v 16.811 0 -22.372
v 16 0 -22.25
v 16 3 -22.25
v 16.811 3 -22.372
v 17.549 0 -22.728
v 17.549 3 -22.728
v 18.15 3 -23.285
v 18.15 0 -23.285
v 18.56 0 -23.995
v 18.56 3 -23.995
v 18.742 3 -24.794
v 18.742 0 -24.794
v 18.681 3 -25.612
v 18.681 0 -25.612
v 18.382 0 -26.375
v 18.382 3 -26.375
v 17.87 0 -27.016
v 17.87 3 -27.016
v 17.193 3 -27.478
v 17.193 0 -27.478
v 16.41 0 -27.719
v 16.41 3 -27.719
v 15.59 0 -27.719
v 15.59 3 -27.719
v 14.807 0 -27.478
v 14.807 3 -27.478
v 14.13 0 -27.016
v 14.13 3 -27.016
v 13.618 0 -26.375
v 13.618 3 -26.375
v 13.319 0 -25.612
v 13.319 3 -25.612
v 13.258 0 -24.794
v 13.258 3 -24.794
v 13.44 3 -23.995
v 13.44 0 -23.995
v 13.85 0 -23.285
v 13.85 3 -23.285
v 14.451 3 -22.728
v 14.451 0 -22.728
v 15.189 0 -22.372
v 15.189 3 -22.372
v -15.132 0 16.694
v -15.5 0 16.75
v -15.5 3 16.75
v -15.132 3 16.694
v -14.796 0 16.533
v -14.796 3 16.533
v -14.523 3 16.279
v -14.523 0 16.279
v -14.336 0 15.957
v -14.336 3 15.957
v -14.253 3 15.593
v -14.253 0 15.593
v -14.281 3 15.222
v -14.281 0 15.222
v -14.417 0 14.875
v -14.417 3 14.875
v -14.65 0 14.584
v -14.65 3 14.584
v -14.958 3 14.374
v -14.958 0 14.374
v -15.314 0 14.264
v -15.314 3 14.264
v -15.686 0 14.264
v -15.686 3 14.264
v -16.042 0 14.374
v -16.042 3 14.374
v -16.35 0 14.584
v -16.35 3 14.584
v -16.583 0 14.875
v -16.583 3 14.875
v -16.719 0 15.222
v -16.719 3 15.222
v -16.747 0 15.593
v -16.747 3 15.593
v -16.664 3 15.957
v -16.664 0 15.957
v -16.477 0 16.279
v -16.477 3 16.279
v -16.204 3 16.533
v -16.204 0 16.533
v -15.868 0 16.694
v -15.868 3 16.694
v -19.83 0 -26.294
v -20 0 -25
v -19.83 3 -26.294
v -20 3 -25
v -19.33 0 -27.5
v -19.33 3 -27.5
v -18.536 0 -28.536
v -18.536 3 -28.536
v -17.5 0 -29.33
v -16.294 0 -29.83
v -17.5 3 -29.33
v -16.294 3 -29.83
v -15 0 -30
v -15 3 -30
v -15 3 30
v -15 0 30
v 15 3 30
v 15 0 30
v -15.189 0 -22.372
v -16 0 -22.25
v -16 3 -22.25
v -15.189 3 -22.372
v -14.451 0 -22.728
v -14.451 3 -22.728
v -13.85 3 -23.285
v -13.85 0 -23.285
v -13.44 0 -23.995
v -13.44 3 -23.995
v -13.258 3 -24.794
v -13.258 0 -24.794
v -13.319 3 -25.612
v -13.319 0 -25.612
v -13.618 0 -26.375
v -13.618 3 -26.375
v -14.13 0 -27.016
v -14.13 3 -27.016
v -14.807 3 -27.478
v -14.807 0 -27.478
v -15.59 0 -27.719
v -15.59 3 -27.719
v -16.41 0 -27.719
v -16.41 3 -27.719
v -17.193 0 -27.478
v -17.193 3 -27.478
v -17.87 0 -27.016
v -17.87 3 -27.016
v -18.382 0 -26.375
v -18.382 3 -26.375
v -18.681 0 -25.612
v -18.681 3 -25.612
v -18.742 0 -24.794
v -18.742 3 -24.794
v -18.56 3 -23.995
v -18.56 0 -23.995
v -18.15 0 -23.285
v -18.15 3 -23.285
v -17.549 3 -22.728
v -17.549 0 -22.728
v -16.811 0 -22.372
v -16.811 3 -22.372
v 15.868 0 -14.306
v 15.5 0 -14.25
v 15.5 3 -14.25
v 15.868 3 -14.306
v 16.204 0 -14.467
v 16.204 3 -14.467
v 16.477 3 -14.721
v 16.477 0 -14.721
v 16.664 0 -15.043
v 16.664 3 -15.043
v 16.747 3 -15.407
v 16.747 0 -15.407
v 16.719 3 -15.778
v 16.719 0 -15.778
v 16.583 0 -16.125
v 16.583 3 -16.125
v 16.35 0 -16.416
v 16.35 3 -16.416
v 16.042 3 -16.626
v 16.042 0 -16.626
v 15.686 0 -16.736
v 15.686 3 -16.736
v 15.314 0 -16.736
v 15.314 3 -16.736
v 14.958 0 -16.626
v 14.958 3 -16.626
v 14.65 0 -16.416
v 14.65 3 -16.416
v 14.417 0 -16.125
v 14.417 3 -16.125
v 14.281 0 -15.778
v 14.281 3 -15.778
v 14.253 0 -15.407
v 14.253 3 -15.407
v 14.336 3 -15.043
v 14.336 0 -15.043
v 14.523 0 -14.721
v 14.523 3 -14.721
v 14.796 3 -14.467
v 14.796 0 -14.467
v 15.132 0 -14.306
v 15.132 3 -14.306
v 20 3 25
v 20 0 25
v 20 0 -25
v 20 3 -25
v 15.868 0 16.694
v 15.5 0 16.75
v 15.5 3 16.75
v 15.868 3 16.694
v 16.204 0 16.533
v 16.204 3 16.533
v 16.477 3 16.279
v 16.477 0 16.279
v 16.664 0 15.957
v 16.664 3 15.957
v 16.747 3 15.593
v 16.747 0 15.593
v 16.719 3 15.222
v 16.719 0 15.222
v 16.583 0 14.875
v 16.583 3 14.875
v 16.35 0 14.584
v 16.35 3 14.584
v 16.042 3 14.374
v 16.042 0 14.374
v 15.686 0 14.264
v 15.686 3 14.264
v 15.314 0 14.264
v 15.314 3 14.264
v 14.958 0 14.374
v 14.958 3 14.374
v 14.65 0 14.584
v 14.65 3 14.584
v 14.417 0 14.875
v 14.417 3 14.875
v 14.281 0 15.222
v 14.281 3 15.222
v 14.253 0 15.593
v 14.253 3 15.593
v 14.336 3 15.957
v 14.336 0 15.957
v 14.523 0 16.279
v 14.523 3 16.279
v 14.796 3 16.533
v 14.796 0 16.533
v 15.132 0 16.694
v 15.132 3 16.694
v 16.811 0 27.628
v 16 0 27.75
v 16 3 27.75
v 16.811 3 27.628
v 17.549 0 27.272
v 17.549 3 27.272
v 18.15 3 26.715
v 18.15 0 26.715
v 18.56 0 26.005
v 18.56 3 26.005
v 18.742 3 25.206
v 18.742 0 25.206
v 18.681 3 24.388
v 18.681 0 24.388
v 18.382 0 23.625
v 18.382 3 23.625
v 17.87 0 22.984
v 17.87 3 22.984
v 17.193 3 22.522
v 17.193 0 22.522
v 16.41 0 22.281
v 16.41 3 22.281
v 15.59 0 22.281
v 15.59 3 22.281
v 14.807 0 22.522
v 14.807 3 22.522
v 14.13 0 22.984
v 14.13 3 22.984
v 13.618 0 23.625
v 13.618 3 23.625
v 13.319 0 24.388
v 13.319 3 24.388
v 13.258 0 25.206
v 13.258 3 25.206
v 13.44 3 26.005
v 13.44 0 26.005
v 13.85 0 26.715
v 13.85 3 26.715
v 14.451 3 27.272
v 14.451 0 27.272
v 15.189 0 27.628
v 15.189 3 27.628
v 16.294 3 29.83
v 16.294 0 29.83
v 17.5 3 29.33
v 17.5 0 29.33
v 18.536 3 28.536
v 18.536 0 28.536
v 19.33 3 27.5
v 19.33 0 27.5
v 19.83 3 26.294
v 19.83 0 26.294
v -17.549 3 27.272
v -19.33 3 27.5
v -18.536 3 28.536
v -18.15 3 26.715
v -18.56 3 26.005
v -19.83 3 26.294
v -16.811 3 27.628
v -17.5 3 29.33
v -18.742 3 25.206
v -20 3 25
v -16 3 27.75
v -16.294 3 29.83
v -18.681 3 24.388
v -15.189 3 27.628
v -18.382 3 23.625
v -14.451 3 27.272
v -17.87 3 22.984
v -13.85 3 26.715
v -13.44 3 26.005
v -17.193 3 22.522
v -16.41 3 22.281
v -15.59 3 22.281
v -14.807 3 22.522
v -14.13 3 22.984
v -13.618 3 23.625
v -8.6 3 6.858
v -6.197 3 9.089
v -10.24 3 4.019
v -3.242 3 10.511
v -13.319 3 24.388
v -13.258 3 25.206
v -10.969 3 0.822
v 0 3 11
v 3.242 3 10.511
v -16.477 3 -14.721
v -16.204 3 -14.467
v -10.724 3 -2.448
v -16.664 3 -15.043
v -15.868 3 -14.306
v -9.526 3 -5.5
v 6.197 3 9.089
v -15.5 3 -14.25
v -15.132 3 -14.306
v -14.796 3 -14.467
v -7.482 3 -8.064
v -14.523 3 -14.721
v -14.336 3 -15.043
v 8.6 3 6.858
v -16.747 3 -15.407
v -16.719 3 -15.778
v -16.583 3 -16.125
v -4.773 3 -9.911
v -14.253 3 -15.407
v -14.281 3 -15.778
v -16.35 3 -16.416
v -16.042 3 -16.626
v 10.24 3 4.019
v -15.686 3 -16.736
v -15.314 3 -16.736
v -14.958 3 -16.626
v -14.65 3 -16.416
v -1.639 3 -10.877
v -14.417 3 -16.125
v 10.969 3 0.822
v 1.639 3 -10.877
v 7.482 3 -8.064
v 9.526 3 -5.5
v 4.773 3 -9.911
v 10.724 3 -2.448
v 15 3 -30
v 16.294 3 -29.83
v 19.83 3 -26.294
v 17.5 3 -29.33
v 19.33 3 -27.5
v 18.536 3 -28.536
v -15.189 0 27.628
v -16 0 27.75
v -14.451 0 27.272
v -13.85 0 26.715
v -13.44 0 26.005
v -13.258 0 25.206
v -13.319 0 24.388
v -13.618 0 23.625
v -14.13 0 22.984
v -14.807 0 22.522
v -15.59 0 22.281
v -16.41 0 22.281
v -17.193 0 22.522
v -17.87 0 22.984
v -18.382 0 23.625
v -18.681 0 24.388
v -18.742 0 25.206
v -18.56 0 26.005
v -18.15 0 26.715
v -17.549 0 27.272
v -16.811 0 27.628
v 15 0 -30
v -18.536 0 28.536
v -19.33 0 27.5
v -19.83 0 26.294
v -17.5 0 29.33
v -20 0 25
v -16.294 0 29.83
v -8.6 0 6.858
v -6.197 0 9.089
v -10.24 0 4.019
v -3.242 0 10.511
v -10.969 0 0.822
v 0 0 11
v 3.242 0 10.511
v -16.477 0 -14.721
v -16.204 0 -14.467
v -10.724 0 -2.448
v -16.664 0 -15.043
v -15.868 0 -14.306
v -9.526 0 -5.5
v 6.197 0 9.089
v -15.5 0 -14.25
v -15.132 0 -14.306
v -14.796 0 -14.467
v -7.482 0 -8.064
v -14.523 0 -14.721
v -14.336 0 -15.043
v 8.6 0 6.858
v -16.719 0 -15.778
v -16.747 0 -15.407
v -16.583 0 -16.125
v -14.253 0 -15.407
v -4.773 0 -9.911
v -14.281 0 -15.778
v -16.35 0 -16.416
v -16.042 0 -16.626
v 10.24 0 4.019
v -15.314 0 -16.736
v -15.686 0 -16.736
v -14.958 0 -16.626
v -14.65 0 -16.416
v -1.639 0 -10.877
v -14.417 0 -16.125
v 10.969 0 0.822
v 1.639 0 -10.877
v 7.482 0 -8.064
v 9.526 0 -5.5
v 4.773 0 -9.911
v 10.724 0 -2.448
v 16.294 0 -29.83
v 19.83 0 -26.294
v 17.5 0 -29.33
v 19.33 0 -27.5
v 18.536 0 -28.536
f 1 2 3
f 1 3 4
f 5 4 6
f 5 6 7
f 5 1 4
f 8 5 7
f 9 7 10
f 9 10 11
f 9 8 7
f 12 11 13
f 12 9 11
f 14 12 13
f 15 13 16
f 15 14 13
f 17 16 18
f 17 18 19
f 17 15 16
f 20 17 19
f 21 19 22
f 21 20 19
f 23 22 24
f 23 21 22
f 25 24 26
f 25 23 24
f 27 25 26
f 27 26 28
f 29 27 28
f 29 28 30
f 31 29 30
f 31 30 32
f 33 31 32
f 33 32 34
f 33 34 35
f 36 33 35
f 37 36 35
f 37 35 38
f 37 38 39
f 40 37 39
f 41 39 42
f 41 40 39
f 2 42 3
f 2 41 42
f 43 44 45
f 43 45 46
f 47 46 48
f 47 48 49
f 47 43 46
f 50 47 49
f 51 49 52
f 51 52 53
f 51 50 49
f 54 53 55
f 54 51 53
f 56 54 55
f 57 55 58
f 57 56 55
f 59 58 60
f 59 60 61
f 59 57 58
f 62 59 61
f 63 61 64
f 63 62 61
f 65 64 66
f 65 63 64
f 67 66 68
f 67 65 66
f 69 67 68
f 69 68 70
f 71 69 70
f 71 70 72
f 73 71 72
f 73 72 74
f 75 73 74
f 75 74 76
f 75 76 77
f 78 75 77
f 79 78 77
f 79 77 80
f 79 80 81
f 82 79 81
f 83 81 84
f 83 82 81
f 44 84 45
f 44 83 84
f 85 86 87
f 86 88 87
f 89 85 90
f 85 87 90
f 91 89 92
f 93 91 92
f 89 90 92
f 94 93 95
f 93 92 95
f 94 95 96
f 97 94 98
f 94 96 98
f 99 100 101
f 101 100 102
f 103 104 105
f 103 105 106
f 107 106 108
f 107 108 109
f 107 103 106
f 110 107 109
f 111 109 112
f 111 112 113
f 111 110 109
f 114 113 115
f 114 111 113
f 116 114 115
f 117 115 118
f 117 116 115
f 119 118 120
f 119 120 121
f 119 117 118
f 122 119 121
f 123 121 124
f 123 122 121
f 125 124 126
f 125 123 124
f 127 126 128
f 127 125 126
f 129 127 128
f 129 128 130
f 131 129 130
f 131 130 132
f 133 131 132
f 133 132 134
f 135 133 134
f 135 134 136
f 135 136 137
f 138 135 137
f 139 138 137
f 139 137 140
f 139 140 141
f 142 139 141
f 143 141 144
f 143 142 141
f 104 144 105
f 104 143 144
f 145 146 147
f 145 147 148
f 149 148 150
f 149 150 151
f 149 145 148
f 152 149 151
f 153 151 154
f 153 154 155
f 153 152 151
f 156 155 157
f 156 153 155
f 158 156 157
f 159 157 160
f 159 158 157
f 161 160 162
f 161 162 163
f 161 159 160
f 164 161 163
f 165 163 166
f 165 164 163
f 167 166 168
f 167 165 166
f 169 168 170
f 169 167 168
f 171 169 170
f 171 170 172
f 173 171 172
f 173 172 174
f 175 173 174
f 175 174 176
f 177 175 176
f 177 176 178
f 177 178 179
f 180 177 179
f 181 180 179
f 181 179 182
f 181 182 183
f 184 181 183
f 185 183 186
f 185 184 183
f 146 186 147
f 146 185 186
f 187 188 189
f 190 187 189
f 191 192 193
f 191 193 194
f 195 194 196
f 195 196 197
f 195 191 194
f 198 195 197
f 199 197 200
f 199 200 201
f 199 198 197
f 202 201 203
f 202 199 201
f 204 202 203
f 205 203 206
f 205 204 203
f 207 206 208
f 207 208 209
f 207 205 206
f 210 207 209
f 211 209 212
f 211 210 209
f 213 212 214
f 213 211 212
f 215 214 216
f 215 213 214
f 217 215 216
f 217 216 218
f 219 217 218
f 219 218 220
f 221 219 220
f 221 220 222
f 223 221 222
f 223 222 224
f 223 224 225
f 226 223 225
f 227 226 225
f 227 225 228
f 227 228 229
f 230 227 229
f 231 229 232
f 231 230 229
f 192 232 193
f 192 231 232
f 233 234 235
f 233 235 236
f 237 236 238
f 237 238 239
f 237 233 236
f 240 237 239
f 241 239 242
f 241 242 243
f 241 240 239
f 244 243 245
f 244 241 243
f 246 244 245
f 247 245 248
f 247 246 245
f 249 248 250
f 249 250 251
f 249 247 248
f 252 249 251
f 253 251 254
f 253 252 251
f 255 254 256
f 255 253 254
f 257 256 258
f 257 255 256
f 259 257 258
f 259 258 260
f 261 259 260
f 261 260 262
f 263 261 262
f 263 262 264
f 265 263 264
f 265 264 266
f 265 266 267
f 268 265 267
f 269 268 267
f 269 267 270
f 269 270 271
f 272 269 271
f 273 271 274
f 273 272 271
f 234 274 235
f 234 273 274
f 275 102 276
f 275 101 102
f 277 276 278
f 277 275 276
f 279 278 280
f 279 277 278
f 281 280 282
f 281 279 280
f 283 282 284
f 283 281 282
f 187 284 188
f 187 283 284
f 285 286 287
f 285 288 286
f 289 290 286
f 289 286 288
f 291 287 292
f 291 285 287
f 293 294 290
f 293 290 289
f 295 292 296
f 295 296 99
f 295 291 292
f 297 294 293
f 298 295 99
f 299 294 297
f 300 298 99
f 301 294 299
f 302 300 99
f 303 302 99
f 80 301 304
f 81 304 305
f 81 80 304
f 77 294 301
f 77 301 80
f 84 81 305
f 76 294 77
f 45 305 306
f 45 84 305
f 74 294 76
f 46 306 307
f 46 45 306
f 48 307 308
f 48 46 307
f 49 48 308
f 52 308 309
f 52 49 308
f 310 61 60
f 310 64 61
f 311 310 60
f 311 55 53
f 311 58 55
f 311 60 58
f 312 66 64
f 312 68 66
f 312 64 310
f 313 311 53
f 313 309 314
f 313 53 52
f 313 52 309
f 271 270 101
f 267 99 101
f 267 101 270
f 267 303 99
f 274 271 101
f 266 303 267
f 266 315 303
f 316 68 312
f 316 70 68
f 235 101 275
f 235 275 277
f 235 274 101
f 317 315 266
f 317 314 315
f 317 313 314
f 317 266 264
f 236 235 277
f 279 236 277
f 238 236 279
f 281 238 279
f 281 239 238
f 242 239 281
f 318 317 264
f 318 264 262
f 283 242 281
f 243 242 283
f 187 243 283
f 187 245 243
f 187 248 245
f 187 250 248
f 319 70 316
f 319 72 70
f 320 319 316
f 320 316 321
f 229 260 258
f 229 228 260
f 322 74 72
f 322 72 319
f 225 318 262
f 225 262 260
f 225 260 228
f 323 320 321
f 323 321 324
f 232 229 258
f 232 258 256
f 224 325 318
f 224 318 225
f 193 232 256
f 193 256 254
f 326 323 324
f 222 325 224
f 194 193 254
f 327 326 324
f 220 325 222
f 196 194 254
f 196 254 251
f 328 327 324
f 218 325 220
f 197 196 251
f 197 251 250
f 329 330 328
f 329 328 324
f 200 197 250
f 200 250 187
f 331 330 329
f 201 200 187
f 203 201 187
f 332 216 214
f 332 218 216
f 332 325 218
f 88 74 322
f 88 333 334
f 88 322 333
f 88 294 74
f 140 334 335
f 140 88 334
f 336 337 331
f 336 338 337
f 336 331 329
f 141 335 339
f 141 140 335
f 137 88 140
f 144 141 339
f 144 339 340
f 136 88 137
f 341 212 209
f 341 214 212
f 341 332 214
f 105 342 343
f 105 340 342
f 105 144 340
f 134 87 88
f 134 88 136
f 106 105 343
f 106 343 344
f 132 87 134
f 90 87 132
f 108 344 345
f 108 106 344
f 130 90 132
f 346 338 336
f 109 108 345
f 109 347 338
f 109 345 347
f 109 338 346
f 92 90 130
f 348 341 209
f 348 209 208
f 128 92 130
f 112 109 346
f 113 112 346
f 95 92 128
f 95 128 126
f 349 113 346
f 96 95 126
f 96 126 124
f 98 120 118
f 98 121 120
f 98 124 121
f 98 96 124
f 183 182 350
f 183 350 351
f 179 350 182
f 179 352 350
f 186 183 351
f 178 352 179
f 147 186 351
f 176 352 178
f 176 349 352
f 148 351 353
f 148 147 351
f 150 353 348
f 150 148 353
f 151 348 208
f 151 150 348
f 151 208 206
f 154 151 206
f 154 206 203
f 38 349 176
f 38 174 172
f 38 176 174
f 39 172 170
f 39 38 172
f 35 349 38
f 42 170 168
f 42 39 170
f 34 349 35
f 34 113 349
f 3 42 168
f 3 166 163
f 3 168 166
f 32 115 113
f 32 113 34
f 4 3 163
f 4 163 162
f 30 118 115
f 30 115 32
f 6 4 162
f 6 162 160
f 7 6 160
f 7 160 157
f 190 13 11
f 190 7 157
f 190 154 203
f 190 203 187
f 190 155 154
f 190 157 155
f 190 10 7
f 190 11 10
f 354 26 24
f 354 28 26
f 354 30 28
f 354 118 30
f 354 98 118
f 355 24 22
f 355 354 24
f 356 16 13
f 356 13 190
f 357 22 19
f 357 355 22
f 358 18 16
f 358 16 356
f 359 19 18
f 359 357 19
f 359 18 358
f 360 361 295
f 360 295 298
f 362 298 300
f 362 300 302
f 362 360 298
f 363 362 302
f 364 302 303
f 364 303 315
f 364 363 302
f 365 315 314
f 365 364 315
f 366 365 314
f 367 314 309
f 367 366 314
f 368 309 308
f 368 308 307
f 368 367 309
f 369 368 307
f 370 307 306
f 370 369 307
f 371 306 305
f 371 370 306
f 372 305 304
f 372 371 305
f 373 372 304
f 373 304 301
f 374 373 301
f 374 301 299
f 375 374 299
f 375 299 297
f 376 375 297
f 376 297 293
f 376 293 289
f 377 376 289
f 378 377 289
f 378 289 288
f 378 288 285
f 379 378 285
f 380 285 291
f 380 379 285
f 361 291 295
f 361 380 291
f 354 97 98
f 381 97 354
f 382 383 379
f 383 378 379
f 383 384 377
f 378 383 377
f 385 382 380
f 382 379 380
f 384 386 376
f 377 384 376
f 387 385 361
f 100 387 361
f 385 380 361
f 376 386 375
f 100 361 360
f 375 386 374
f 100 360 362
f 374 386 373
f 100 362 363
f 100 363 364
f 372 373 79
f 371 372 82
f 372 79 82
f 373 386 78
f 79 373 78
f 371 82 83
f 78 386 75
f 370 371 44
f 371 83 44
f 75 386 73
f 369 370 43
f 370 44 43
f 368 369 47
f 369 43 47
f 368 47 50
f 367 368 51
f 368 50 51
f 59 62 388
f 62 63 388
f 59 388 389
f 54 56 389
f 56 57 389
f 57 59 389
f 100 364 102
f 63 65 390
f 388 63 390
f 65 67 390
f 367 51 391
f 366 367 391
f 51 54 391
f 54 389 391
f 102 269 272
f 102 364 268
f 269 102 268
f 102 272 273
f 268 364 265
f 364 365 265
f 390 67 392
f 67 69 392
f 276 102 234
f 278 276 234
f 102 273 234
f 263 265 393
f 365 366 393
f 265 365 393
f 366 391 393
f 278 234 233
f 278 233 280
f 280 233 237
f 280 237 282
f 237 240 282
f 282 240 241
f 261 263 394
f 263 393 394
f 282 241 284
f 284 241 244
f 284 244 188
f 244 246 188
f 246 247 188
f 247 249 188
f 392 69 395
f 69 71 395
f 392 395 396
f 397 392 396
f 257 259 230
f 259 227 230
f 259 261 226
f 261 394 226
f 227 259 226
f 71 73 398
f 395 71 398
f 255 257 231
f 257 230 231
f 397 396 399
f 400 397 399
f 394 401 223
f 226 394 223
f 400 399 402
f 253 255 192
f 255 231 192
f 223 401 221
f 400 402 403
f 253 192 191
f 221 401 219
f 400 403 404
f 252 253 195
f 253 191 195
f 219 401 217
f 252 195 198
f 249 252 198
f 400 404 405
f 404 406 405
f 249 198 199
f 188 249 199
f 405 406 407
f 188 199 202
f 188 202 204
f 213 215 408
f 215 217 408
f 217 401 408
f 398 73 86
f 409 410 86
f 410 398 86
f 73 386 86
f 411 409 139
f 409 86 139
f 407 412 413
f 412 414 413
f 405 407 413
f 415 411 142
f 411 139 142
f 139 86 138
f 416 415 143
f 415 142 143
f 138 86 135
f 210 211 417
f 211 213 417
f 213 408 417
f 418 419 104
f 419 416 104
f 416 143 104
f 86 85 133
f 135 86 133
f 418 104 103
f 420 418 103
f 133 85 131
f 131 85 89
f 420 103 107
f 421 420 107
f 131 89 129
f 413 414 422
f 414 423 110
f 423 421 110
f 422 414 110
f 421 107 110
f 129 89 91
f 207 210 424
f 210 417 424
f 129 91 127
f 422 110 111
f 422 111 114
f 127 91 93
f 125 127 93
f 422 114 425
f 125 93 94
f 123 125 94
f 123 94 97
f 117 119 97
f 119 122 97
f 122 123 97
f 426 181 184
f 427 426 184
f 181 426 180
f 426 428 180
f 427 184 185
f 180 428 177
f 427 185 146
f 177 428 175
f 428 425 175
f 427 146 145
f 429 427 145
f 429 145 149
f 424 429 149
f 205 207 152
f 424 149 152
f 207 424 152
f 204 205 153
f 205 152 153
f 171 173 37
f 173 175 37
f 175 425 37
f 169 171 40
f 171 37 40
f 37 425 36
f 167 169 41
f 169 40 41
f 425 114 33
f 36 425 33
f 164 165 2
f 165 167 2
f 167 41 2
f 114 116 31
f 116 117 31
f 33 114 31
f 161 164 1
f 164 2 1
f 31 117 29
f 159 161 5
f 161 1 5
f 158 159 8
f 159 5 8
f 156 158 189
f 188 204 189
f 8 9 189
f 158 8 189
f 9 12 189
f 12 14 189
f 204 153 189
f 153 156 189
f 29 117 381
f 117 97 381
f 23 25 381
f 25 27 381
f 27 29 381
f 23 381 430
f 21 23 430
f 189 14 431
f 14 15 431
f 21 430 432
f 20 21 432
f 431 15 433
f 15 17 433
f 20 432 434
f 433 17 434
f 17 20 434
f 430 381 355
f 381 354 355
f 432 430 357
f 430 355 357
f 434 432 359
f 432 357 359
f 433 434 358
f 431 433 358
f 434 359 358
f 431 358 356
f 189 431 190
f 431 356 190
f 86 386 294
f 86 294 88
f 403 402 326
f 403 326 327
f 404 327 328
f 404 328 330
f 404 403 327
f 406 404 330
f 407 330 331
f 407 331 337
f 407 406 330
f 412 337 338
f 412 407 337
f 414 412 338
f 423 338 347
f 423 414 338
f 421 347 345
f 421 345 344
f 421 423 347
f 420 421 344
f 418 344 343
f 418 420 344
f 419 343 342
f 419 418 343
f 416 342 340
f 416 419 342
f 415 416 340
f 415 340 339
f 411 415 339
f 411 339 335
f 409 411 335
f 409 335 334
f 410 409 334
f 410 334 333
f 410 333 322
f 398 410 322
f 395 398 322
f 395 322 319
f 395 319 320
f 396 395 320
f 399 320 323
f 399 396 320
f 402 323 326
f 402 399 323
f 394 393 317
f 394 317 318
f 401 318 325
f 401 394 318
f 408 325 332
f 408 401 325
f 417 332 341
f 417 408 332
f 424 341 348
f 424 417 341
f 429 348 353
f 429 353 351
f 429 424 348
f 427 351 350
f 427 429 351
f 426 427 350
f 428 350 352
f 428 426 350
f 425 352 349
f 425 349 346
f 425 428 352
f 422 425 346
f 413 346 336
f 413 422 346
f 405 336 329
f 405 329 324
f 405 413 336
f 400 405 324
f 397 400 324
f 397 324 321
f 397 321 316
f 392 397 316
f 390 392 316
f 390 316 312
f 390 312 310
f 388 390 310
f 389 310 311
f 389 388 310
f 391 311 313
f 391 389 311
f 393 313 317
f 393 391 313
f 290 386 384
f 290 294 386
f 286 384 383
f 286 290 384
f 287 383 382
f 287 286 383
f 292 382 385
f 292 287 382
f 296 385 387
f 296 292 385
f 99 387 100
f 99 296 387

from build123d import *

# Parameters (mm, degrees)
SKETCH1_W           = 40
SKETCH1_H           = 60
SKETCH1_R           = 2.75
SKETCH1_R_2         = 1.25
SKETCH1_R_3         = 11
SKETCH1_R_4         = 4
BOSS_EXTRUDE1_DEPTH = 3
FILLET1_R           = 5


with BuildPart() as part:
    # Sketch1 → Boss-Extrude1 (new body)
    # profile 1 of 3: a face of its own
    with BuildSketch(Plane(origin=(0, 0, 0), x_dir=(1, 0, 0), z_dir=(0, 1, 0))):
        Rectangle(SKETCH1_W, SKETCH1_H)
        with Locations(Location((16, -25, 0), (0, 0, 270))):
            Circle(SKETCH1_R, mode=Mode.SUBTRACT)
        with Locations(Location((-16, -25, 0), (0, 0, 270))):
            Circle(SKETCH1_R, mode=Mode.SUBTRACT)
        with Locations(Location((16, 25, 0), (0, 0, 270))):
            Circle(SKETCH1_R, mode=Mode.SUBTRACT)
        with Locations(Location((-16, 25, 0), (0, 0, 270))):
            Circle(SKETCH1_R, mode=Mode.SUBTRACT)
        with Locations(Location((15.5, -15.5, 0), (0, 0, 270))):
            Circle(SKETCH1_R_2, mode=Mode.SUBTRACT)
        with Locations(Location((15.5, 15.5, 0), (0, 0, 270))):
            Circle(SKETCH1_R_2, mode=Mode.SUBTRACT)
        with Locations(Location((-15.5, 15.5, 0), (0, 0, 270))):
            Circle(SKETCH1_R_2, mode=Mode.SUBTRACT)
        with Locations(Location((-15.5, -15.5, 0), (0, 0, 270))):
            Circle(SKETCH1_R_2, mode=Mode.SUBTRACT)
        with Locations(Location((0, 0, 0), (0, 0, 270))):
            Circle(SKETCH1_R_3, mode=Mode.SUBTRACT)
        with Locations((0, 25)):
            Circle(SKETCH1_R_4, mode=Mode.SUBTRACT)
        with Locations((0, -25)):
            Circle(SKETCH1_R_4, mode=Mode.SUBTRACT)
    # profile 2 of 3: a face of its own
    with BuildSketch(Plane(origin=(0, 0, 0), x_dir=(1, 0, 0), z_dir=(0, 1, 0))):
        with Locations((0, 25)):
            Circle(SKETCH1_R_4)
    # profile 3 of 3: a face of its own
    with BuildSketch(Plane(origin=(0, 0, 0), x_dir=(1, 0, 0), z_dir=(0, 1, 0))):
        with Locations((0, -25)):
            Circle(SKETCH1_R_4)
    extrude(amount=BOSS_EXTRUDE1_DEPTH)

    # Fillet1
    fillet1_edges = [part.edges().sort_by_distance(p)[0] for p in [
        (20, 1.5, 30),
        (-20, 1.5, 30),
        (-20, 1.5, -30),
        (20, 1.5, -30),
    ]]
    fillet(fillet1_edges, radius=FILLET1_R)


solid = part.part
